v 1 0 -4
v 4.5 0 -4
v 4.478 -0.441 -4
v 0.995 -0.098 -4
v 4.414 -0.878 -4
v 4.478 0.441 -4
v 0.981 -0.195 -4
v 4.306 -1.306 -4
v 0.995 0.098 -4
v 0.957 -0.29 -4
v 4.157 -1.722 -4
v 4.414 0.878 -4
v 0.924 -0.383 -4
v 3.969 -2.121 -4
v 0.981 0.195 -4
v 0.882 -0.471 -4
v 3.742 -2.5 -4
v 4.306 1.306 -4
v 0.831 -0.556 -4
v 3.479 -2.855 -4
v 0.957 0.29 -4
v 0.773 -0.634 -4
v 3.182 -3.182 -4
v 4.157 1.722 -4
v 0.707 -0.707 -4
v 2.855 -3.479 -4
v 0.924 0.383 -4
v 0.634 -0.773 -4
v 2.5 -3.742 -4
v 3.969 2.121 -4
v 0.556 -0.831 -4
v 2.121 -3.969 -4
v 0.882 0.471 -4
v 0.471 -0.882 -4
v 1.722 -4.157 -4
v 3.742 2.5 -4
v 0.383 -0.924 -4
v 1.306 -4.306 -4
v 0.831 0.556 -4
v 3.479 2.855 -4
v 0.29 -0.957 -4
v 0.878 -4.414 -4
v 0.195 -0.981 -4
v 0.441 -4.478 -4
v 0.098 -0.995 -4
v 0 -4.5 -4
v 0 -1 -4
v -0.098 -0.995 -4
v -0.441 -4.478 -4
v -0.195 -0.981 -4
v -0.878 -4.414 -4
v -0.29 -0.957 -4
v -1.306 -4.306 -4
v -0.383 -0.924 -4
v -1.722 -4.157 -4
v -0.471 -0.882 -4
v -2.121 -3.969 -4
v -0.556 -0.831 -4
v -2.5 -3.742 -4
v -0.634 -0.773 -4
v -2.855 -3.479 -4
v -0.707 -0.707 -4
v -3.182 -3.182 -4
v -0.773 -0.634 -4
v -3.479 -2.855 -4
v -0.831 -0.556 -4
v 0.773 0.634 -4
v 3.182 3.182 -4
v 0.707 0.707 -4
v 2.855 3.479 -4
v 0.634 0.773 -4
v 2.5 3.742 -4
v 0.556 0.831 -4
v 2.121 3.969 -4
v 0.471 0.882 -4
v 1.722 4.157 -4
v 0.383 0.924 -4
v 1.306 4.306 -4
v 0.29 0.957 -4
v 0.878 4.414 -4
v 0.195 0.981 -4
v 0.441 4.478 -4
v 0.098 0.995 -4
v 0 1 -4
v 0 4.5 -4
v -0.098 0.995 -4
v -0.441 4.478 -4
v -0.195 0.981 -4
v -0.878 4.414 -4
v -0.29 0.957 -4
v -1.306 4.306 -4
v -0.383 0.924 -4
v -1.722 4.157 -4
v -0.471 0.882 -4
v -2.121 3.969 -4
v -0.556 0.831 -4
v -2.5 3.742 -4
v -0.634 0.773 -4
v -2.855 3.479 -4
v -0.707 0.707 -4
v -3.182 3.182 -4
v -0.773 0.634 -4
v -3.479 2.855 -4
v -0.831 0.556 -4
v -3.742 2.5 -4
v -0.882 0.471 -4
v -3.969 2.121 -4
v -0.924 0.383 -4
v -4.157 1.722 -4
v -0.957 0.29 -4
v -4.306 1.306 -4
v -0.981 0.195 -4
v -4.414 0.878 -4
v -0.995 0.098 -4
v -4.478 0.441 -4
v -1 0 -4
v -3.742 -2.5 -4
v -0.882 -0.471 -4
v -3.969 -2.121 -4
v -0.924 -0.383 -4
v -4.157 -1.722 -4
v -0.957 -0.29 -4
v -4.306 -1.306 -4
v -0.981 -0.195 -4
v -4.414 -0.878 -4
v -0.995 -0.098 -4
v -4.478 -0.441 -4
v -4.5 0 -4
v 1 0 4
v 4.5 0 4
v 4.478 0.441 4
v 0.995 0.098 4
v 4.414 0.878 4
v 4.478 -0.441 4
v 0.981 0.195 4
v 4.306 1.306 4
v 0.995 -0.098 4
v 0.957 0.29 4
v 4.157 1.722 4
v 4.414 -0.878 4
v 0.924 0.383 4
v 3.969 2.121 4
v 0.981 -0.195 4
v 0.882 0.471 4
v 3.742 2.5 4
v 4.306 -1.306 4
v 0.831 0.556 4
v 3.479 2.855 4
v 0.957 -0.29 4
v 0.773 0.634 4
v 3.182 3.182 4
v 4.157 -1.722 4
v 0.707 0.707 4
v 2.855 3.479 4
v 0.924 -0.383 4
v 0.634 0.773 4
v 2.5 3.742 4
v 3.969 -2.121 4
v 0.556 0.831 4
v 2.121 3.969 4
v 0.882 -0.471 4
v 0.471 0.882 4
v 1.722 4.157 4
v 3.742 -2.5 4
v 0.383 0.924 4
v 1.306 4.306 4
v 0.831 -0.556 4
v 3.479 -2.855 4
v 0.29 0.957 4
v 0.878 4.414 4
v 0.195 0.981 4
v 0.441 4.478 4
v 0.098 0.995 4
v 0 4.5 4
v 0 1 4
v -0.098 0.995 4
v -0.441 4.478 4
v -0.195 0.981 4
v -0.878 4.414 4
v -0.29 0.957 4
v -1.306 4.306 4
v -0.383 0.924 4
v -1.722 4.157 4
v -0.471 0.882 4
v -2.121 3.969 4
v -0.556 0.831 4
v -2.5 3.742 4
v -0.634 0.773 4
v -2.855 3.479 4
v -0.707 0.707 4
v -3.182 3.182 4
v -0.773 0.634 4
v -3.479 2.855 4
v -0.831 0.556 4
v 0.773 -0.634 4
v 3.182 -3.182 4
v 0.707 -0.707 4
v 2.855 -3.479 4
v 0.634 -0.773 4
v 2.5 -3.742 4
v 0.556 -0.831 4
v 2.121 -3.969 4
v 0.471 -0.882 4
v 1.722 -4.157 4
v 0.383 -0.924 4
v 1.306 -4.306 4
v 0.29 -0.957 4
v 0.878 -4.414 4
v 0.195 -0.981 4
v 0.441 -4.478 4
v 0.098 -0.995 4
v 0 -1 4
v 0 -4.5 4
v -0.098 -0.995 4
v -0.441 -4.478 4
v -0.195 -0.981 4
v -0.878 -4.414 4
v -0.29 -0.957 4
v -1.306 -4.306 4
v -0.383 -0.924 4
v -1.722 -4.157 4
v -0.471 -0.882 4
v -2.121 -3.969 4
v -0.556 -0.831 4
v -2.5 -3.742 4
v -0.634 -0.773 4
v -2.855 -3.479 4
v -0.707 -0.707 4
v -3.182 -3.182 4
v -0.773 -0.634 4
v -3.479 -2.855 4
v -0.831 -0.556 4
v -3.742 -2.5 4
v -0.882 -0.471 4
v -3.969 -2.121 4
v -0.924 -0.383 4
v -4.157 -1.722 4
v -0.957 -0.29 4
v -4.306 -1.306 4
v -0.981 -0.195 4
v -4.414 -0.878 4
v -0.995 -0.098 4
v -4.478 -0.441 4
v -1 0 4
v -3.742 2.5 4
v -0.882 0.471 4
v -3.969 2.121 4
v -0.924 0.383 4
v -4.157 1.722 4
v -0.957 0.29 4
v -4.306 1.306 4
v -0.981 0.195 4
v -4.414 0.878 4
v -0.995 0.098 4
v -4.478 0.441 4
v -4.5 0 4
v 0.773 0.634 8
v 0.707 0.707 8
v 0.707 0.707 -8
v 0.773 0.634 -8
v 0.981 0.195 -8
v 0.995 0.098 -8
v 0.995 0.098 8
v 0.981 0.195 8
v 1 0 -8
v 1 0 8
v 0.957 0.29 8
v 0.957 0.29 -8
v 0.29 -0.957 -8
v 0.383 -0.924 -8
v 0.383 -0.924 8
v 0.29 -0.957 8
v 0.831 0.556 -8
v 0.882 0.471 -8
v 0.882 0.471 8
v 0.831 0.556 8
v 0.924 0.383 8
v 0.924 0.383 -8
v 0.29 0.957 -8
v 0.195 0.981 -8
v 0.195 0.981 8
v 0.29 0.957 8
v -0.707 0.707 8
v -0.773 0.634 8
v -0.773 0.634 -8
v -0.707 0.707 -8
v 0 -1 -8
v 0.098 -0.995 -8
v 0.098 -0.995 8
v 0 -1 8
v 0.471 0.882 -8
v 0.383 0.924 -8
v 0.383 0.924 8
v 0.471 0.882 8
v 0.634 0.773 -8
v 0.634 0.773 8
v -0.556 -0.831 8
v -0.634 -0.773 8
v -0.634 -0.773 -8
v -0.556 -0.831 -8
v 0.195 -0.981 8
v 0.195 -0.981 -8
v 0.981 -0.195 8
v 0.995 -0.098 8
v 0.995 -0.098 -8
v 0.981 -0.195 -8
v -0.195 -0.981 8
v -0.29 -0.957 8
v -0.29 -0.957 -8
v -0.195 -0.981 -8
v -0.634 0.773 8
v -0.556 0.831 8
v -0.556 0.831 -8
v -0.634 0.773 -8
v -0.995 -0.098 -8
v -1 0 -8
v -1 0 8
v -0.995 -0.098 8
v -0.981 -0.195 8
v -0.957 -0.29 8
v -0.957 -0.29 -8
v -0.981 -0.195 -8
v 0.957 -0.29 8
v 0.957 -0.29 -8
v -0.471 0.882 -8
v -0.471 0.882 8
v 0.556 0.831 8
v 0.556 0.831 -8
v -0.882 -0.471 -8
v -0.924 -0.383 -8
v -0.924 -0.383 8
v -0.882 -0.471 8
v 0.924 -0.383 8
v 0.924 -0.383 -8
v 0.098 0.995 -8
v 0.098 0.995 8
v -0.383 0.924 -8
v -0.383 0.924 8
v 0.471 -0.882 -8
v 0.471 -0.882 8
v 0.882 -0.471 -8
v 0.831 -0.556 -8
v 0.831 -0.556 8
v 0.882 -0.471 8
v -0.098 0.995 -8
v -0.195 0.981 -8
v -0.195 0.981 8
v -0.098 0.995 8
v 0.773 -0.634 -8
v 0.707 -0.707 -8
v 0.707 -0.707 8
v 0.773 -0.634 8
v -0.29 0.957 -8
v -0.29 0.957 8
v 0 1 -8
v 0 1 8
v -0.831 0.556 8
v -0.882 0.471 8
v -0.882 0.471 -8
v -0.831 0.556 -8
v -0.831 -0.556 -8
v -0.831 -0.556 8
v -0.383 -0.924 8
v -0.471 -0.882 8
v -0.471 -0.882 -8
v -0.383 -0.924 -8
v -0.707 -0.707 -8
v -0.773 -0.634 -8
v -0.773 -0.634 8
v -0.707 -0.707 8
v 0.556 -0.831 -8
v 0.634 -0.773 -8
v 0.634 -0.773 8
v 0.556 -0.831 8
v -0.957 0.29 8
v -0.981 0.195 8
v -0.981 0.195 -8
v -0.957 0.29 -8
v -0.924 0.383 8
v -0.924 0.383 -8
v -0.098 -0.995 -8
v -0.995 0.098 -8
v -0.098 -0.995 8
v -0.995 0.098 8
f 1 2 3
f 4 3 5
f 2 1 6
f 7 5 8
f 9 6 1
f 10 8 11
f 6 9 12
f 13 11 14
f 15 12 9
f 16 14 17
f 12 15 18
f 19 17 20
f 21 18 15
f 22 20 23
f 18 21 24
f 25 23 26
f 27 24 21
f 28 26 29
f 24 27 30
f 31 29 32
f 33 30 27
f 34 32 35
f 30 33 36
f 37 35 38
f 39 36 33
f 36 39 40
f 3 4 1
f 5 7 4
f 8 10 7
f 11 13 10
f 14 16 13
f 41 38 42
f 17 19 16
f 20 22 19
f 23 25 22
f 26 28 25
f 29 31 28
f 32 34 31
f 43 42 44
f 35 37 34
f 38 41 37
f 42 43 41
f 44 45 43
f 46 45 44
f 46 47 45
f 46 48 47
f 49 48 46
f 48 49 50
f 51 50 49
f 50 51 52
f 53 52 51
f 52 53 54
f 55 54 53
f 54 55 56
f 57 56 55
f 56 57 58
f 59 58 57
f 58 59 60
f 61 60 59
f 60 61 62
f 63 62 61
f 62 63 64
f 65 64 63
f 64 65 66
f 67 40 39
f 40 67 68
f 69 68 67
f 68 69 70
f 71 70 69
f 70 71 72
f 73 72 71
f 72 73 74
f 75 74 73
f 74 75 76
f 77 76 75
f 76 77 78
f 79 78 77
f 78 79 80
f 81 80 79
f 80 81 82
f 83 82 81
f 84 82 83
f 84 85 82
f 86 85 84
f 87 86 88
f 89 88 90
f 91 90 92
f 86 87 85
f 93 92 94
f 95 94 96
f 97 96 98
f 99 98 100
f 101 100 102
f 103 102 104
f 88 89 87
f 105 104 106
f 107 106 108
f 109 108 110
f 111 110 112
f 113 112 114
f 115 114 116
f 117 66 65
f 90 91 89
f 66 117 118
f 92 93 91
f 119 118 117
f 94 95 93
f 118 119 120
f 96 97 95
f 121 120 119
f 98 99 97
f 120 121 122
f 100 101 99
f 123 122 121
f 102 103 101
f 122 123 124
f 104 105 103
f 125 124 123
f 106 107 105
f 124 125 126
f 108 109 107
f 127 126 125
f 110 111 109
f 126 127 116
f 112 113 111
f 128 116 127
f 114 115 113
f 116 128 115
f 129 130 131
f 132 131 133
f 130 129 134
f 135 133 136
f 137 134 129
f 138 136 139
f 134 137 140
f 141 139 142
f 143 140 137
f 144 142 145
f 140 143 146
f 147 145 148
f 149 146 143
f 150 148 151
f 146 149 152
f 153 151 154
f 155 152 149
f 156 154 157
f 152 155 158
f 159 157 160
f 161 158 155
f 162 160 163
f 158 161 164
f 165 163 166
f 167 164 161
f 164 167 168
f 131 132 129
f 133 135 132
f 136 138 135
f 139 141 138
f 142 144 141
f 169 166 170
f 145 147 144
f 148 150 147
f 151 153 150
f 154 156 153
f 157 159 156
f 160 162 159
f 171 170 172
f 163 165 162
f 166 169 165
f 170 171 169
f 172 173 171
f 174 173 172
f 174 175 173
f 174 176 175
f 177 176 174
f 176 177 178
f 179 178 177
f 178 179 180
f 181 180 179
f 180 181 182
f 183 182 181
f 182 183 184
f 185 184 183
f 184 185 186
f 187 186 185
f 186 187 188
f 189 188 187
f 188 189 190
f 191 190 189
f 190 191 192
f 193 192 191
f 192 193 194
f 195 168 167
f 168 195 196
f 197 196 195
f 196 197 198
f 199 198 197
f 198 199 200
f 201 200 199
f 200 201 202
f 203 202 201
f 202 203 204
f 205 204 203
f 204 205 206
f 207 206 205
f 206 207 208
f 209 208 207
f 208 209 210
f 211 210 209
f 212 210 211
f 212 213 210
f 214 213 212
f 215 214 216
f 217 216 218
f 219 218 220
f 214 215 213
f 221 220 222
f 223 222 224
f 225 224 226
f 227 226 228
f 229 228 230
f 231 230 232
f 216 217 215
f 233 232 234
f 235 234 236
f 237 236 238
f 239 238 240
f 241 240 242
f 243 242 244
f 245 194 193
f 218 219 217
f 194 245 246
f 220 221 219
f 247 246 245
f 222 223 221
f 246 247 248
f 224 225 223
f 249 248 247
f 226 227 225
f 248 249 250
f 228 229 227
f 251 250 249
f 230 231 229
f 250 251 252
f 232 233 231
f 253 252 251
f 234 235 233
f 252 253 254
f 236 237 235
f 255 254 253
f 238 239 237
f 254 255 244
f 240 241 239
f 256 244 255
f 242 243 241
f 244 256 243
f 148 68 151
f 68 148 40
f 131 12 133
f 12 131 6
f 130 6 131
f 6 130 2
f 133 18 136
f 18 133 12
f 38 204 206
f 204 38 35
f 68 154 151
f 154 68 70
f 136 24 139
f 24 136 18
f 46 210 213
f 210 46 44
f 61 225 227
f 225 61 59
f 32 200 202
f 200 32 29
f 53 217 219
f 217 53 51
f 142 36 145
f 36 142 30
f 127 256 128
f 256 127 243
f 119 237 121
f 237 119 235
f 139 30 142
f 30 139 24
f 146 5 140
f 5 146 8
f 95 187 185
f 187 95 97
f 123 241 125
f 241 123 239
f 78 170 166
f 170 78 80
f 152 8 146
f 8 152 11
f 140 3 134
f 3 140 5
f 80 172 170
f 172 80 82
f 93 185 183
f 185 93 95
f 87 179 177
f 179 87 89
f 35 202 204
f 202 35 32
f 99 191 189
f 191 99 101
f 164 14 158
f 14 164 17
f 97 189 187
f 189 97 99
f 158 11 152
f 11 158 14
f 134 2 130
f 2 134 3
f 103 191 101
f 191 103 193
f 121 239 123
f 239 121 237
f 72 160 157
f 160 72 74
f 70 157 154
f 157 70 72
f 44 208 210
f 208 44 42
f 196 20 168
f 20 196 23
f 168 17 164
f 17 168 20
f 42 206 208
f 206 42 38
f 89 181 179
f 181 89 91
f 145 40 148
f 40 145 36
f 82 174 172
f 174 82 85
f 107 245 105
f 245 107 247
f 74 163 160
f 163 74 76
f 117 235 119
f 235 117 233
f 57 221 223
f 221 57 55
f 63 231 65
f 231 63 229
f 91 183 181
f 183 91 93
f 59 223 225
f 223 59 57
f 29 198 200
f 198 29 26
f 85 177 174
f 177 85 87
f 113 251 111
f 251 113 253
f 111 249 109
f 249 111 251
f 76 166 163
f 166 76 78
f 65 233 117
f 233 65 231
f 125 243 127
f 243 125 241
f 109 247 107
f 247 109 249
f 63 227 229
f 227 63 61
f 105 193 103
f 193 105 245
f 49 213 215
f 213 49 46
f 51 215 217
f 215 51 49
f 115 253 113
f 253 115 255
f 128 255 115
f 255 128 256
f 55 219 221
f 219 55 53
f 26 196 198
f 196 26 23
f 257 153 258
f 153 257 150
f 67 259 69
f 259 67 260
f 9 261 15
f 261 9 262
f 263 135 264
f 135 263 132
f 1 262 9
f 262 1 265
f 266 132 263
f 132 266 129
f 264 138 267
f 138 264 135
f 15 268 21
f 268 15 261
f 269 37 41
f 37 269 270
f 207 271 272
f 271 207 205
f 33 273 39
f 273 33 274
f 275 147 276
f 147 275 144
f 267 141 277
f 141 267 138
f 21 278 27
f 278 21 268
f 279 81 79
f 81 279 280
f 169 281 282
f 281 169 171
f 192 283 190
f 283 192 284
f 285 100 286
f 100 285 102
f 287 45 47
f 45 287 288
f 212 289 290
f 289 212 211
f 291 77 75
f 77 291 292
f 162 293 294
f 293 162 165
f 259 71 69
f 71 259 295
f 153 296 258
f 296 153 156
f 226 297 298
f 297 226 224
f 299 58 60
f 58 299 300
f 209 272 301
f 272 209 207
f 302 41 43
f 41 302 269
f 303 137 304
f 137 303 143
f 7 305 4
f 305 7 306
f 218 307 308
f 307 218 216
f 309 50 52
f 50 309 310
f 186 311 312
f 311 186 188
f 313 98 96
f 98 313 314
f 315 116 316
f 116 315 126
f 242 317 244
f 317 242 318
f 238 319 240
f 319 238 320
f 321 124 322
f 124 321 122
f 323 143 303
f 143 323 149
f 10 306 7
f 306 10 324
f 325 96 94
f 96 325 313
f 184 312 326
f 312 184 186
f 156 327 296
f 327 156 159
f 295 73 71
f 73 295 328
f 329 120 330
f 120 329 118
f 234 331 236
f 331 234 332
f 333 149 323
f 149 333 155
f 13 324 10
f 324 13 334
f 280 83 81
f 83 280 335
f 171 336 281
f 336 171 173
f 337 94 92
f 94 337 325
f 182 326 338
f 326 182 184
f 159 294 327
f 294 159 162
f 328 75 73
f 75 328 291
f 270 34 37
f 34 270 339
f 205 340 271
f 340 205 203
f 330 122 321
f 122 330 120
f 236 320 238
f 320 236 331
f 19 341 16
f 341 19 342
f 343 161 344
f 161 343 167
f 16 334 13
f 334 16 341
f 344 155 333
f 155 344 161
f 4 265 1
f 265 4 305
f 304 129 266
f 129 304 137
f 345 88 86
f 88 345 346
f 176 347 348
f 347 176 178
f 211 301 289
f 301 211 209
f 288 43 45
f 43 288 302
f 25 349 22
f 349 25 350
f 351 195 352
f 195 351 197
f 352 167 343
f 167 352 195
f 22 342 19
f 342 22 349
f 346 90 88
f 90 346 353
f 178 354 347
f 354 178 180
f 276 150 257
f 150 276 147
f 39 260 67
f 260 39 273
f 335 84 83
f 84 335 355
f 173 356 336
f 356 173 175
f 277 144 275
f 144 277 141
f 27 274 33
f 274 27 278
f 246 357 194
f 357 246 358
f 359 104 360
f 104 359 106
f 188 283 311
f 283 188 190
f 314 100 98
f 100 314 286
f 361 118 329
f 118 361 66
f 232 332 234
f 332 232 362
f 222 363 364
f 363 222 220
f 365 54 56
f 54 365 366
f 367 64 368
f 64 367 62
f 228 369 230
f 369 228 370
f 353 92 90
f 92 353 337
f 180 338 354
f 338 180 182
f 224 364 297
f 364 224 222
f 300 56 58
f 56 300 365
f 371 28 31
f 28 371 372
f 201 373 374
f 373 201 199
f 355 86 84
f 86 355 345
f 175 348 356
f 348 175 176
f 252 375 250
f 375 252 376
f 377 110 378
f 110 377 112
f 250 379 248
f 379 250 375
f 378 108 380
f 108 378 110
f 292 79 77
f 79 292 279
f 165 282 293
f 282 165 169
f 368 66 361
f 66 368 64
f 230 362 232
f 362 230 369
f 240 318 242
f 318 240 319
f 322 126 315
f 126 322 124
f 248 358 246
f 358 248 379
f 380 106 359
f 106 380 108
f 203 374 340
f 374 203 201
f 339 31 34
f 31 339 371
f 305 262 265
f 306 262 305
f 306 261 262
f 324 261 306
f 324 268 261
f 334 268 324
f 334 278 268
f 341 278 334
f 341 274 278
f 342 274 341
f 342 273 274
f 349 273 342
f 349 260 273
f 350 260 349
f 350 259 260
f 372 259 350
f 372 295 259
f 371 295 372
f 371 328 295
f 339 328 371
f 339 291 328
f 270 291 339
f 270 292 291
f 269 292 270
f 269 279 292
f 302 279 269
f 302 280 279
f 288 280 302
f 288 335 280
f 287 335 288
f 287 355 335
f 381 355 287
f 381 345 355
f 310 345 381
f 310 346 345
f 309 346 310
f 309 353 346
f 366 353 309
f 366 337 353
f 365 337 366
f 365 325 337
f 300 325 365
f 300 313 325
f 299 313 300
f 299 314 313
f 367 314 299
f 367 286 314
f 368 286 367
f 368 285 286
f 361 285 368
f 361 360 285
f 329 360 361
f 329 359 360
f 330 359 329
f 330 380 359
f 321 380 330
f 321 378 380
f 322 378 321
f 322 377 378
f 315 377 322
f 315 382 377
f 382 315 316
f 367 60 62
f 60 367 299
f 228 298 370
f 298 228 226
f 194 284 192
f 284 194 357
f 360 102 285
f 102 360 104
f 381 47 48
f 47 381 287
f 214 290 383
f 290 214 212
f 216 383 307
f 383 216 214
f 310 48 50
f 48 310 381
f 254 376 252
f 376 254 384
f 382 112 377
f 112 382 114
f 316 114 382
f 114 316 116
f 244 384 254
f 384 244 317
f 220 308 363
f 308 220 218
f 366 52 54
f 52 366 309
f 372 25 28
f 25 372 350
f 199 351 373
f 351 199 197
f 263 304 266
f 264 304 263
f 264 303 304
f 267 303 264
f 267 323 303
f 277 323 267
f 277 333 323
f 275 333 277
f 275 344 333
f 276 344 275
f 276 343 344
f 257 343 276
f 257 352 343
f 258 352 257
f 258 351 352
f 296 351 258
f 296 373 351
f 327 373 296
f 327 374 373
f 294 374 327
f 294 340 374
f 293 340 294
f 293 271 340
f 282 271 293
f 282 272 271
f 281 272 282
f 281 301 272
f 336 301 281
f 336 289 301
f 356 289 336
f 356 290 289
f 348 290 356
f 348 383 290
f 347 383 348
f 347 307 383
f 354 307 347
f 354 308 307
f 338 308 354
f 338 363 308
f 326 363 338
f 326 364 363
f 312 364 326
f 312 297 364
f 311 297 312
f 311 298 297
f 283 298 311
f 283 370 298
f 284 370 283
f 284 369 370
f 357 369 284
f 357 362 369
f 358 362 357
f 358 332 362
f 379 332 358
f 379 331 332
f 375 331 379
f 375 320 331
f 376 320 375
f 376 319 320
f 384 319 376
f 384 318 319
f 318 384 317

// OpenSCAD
module brushless_motor() {
    // Stator
    translate([0, 0, -4])
    cylinder(d=9.0, h=8.0, $fn=64);
    
    // Rotor
    translate([0, 0, -4])
    difference() {
        cylinder(d=8.0, h=8.0, $fn=64);
        translate([0, 0, -4])
        cylinder(d=6.0, h=8.0, $fn=64);
    }
    
    // Shaft
    translate([0, 0, -8])
    cylinder(d=2.0, h=16.0, $fn=64);
}

brushless_motor();
